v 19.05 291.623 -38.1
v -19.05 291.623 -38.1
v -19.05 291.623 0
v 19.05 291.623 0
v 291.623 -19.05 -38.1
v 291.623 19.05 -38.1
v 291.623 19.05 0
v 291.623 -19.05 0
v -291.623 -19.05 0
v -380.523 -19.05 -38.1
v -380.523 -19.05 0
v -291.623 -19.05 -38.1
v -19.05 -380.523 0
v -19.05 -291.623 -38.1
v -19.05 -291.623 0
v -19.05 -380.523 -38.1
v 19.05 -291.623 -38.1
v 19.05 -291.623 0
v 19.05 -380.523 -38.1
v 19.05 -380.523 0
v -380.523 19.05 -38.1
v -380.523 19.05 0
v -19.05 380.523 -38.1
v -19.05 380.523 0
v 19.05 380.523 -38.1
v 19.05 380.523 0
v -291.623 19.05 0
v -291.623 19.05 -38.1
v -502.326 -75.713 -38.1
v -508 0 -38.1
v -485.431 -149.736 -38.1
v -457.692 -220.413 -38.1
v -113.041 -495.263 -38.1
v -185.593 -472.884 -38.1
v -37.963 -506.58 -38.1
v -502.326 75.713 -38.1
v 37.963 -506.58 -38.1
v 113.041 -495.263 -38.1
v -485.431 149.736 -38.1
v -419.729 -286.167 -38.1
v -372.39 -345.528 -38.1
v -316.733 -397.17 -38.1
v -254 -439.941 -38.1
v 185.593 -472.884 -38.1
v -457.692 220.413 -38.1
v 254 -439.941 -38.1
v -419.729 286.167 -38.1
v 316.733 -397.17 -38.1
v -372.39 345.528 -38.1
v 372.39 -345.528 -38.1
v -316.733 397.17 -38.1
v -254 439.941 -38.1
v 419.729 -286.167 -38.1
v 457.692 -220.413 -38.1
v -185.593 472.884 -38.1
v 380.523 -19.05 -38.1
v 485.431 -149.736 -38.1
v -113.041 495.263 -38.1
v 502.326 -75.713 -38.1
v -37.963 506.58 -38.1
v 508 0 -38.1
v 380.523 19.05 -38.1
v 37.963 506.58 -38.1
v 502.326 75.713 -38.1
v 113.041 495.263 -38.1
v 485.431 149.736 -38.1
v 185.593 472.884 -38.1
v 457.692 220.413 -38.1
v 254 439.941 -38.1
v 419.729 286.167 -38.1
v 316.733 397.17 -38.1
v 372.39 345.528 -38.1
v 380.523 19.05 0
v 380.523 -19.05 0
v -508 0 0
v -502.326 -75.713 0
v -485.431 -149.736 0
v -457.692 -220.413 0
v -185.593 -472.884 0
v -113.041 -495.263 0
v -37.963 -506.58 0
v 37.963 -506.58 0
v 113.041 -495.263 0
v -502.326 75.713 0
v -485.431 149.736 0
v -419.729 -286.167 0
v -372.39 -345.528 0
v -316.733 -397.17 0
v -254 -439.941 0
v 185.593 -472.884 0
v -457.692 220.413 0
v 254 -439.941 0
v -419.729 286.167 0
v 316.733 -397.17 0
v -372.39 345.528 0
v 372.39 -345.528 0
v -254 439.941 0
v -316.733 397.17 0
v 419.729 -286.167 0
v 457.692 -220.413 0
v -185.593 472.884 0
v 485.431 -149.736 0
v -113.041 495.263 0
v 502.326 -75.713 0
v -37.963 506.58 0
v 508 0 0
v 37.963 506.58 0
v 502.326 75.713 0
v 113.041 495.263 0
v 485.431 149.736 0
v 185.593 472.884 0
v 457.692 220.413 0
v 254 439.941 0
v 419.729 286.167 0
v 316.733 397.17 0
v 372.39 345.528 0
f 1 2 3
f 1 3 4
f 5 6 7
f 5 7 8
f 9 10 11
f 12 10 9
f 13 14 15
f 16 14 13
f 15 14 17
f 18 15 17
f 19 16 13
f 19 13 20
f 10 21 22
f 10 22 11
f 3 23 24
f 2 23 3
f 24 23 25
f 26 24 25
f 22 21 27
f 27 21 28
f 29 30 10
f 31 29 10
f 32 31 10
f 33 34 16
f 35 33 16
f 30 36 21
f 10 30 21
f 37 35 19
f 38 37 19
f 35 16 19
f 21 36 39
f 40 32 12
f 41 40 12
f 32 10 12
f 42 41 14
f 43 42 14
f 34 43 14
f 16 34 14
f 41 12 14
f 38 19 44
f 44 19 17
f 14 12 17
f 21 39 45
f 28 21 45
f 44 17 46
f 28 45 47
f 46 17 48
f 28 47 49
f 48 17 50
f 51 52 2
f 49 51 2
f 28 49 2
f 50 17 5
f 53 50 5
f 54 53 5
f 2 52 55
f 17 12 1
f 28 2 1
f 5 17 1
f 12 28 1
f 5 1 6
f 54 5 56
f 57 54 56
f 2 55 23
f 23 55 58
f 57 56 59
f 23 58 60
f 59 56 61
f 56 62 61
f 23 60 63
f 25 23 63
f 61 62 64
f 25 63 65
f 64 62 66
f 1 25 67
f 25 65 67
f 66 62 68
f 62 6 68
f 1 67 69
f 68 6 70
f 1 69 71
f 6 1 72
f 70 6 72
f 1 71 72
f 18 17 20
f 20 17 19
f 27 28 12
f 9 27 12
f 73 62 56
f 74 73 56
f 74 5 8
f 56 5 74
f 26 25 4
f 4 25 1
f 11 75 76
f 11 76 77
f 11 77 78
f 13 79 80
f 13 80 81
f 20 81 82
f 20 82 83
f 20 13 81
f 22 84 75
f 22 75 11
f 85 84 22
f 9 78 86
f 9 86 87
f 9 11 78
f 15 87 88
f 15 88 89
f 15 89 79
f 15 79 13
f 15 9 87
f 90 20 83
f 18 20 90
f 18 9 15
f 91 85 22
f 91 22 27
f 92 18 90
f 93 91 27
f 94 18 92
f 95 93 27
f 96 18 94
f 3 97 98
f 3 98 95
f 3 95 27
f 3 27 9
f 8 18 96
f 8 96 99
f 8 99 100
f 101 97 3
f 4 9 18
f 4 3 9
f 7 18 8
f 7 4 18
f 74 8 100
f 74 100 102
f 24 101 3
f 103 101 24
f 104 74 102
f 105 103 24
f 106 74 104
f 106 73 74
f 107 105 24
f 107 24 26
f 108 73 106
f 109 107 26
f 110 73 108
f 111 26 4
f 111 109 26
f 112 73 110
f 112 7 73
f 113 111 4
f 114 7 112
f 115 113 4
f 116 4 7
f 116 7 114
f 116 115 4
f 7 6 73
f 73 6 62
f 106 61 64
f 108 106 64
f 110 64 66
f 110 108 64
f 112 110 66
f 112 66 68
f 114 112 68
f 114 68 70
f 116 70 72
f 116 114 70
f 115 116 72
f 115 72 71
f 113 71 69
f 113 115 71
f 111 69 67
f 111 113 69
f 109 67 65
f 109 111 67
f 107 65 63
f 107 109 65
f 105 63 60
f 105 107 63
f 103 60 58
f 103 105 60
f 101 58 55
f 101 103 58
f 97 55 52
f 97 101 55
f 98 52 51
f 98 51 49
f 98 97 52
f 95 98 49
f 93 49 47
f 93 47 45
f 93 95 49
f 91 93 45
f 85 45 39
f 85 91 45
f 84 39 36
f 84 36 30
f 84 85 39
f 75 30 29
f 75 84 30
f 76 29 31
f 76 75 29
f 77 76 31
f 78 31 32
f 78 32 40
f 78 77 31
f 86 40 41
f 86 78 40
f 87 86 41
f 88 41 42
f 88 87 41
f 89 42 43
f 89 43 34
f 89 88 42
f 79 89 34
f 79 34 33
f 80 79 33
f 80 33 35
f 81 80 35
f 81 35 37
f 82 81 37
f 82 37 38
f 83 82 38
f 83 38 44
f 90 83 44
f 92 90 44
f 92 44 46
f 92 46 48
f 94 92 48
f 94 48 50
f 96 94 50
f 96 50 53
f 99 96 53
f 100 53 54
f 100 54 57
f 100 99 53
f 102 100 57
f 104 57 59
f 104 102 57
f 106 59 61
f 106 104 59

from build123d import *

# Parameters (mm, degrees)
F0_R     = 508
F1_DEPTH = 38.1
F2_W     = 88.9
F2_H     = 38.1
F2_W_2   = 38.1
F2_H_2   = 88.9
F3_DEPTH = 38.101


with BuildPart() as f1:
    # F0 (on Top) → F1 (new body)
    with BuildSketch(Plane.XY):
        Circle(F0_R)
    extrude(amount=-F1_DEPTH)

    # F2 (on face) → F3 (cut, through all)
    with BuildSketch(Plane(origin=(0, 0, -38.1), x_dir=(1, 0, 0), z_dir=(0, 0, -1))):
        with Locations((-336.073452, 0)):
            Rectangle(F2_W, F2_H)
        with Locations((0, -336.073452)):
            Rectangle(F2_W_2, F2_H_2)
        with Locations((336.073452, 0)):
            Rectangle(F2_W, F2_H)
        with Locations((0, 336.073452)):
            Rectangle(F2_W_2, F2_H_2)
    extrude(amount=-F3_DEPTH, mode=Mode.SUBTRACT)


solid = f1.part
